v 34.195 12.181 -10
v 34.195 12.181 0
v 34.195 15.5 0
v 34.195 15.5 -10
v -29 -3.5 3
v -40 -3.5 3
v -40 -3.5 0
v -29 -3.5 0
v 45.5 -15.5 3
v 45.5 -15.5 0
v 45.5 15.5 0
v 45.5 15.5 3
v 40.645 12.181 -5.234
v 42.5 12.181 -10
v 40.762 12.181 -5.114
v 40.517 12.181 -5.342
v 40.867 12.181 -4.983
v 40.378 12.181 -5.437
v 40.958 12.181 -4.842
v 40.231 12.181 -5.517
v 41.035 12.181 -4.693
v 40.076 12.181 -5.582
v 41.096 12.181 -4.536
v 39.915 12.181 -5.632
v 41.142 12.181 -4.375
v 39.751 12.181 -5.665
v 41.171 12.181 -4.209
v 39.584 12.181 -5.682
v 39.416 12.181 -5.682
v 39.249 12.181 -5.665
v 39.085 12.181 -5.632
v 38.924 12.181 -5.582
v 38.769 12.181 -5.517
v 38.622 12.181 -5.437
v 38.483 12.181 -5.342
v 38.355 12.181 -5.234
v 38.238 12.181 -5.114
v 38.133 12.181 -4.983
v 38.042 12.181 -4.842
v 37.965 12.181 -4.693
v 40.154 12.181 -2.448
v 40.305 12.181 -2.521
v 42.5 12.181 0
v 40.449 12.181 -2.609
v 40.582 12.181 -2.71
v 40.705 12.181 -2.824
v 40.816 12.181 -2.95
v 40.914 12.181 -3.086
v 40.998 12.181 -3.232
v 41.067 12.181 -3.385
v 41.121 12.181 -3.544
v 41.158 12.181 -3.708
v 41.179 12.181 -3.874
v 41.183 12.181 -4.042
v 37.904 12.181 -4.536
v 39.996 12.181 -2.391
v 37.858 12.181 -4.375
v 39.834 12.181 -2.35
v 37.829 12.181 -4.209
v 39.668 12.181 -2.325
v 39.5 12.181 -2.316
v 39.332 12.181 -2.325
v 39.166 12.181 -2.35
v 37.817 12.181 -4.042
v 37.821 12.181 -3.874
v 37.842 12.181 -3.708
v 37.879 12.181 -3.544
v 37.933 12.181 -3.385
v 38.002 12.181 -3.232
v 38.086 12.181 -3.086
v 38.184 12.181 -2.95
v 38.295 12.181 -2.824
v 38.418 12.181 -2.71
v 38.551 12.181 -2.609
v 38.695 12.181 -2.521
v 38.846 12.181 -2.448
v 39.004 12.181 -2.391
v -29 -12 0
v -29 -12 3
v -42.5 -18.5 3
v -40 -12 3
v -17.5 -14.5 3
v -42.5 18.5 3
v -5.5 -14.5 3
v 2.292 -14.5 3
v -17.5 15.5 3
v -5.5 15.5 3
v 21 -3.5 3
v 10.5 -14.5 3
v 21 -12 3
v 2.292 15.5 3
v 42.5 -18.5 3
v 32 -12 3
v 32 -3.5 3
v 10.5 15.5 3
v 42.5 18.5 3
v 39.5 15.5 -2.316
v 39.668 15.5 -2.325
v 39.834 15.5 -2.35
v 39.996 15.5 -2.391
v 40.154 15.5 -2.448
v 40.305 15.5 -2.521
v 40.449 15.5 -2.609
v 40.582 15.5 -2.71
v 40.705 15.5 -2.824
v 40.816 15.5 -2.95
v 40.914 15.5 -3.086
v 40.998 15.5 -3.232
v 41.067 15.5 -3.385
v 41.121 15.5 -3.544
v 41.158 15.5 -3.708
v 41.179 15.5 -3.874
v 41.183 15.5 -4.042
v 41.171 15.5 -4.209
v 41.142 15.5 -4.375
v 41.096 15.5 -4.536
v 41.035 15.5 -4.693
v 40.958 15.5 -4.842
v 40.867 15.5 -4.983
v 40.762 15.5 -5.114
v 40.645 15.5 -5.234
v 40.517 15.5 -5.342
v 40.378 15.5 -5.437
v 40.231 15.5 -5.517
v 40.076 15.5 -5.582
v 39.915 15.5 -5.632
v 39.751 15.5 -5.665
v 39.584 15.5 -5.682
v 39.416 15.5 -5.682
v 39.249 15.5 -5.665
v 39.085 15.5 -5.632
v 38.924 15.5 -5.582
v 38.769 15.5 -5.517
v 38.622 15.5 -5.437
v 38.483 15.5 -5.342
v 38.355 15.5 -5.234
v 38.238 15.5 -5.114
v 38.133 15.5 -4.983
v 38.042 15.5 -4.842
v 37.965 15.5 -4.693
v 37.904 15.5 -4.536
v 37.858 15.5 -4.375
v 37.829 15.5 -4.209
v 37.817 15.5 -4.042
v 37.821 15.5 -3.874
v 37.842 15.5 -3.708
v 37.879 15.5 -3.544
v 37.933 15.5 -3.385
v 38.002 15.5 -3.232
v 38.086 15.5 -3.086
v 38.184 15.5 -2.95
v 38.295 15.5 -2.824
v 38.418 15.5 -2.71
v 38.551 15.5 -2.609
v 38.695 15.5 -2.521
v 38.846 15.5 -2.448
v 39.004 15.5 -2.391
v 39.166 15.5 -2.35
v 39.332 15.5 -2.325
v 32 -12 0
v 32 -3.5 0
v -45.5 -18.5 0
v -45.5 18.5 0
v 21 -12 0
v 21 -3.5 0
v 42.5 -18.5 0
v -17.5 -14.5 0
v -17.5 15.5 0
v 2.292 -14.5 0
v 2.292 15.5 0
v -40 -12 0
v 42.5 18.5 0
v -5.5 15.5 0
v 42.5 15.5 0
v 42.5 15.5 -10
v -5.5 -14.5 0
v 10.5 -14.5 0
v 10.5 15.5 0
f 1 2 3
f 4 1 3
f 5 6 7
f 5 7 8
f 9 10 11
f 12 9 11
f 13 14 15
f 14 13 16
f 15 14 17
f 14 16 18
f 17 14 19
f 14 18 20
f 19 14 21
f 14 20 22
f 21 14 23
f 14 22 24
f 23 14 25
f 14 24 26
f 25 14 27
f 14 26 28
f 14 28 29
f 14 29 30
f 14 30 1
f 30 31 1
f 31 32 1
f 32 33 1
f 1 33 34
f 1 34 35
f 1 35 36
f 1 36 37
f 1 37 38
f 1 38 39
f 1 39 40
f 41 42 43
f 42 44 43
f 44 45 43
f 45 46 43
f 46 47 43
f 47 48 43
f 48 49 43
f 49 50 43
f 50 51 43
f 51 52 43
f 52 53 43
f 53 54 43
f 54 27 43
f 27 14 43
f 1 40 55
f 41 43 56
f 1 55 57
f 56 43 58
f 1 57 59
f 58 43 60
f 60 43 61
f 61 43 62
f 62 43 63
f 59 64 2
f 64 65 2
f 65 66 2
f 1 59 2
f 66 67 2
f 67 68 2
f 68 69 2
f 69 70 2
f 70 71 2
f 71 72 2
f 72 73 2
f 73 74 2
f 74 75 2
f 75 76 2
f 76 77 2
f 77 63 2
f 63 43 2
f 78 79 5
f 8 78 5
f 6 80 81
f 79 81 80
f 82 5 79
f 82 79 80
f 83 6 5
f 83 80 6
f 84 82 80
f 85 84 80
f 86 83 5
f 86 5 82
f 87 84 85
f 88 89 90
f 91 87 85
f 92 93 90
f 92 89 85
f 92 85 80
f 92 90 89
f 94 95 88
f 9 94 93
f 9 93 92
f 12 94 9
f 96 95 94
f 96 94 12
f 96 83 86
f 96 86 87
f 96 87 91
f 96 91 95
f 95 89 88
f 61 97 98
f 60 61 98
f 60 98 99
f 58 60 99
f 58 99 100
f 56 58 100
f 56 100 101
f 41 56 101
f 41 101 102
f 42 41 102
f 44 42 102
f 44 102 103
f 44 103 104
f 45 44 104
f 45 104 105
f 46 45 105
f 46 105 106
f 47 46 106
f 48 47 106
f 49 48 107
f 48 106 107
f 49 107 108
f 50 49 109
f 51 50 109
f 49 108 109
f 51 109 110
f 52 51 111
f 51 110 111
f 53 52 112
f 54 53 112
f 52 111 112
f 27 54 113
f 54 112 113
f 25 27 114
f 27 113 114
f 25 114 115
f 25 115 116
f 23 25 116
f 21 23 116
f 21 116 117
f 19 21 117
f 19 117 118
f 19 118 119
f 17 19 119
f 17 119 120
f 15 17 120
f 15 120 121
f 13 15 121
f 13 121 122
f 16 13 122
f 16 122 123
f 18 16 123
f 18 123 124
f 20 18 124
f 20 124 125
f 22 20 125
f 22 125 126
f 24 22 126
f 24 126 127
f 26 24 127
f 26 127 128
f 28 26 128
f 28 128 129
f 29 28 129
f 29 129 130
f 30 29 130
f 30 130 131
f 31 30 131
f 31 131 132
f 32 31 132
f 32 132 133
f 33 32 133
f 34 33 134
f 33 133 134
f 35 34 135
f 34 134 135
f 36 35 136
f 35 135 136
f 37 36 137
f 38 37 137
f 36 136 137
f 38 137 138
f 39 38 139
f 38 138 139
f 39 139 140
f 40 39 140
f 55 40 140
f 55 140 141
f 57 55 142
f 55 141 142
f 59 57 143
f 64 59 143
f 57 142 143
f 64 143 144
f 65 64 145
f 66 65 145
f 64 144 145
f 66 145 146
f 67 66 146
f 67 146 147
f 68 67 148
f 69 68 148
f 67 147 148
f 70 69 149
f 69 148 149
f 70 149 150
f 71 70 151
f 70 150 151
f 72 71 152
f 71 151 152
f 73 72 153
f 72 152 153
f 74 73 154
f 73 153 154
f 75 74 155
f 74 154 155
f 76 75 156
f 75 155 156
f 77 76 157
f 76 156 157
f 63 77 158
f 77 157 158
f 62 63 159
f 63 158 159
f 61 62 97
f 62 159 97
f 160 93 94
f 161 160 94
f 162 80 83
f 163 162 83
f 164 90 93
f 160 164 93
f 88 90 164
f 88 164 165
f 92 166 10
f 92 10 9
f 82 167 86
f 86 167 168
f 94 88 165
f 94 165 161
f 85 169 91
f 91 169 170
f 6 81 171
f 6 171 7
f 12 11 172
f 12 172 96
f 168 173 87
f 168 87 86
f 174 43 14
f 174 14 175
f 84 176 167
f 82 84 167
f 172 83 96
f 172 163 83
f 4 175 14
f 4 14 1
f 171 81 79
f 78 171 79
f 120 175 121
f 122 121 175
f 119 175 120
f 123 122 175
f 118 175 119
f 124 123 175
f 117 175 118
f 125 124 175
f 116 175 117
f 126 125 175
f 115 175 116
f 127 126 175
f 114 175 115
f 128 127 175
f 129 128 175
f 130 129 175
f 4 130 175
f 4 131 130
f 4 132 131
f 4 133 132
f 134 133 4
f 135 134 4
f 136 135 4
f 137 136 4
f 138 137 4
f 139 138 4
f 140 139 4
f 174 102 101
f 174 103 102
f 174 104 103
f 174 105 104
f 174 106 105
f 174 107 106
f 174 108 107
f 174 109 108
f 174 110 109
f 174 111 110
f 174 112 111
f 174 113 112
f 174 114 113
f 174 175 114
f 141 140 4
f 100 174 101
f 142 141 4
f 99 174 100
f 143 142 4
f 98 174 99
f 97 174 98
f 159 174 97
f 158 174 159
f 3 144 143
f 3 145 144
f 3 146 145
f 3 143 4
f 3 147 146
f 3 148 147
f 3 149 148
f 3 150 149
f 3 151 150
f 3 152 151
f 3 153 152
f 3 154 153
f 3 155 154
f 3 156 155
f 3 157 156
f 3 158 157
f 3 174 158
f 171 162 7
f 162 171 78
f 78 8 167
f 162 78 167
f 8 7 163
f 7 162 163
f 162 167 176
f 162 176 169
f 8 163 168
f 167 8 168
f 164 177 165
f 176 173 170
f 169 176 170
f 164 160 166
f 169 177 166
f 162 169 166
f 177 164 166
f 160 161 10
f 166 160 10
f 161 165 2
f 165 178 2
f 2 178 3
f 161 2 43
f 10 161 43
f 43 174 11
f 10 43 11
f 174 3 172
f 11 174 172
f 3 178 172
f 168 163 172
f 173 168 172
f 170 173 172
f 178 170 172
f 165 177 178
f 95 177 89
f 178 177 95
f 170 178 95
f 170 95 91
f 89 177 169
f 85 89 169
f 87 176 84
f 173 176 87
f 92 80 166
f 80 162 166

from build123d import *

# Parameters (mm, degrees)
SKETCH_1_W          = 91
SKETCH_1_H          = 37
EXTRUDE_1_DEPTH     = 3
CHAMFER_1_SIZE      = 3
SKETCH_2_W          = 11
SKETCH_2_H          = 8.5
CUT_EXTRUDE_1_DEPTH = 10
SKETCH_3_W          = 12
SKETCH_3_H          = 30
SKETCH_3_W_2        = 8.207535441
CUT_EXTRUDE_2_DEPTH = 10
SKETCH_4_W          = 8.305337468
SKETCH_4_H          = 3.319312894
EXTRUDE_2_DEPTH     = 10
SKETCH_5_R          = 1.683787266
CUT_EXTRUDE_3_DEPTH = 10
CHAMFER_2_SIZE      = 3
CHAMFER_3_SIZE      = 3


with BuildPart() as part:
    # 草图1 → 凸台-拉伸1 (new body)
    with BuildSketch(Plane.XY):
        Rectangle(SKETCH_1_W, SKETCH_1_H)
    extrude(amount=EXTRUDE_1_DEPTH)

    # 倒角1
    chamfer_1_edges = [part.edges().sort_by_distance(p)[0] for p in [
        (-45.5, 0, 3),
    ]]
    chamfer(chamfer_1_edges, length=CHAMFER_1_SIZE - 0.0001)  # a hair under: the kernel refuses the full size

    # 草图2 → 切除-拉伸1 (cut)
    with BuildSketch(Plane.XY.offset(3)):
        with Locations((-34.5, -7.75)):
            Rectangle(SKETCH_2_W, SKETCH_2_H)
        with Locations((26.5, -7.75)):
            Rectangle(SKETCH_2_W, SKETCH_2_H)
    extrude(amount=-CUT_EXTRUDE_1_DEPTH, mode=Mode.SUBTRACT)

    # 草图3 → 切除-拉伸2 (cut)
    with BuildSketch(Plane(origin=(0, 0, 0), x_dir=(-1, 0, 0), z_dir=(0, 0, -1))):
        with Locations((11.5, 0.5)):
            Rectangle(SKETCH_3_W, SKETCH_3_H)
        with Locations((-6.39623228, 0.5)):
            Rectangle(SKETCH_3_W_2, SKETCH_3_H)
    extrude(amount=-CUT_EXTRUDE_2_DEPTH, mode=Mode.SUBTRACT)

    # 草图4 → 凸台-拉伸2 (add)
    with BuildSketch(Plane(origin=(0, 0, 0), x_dir=(-1, 0, 0), z_dir=(0, 0, -1))):
        with Locations((-38.347331266, 13.840343553)):
            Rectangle(SKETCH_4_W, SKETCH_4_H)
    extrude(amount=EXTRUDE_2_DEPTH)

    # 草图5 → 切除-拉伸3 (cut)
    with BuildSketch(Plane(origin=(0, 15.5, 0), x_dir=(1, 0, 0), z_dir=(0, 1, 0))):
        with Locations(Location((39.5, 4, 0), (0, 0, 270))):
            Circle(SKETCH_5_R)
    extrude(amount=-CUT_EXTRUDE_3_DEPTH, mode=Mode.SUBTRACT)

    # 倒角2
    chamfer_2_edges = [part.edges().sort_by_distance(p)[0] for p in [
        (45.5, 18.5, 1.5),
    ]]
    chamfer(chamfer_2_edges, length=CHAMFER_2_SIZE)

    # 倒角3
    chamfer_3_edges = [part.edges().sort_by_distance(p)[0] for p in [
        (45.5, -18.5, 1.5),
    ]]
    chamfer(chamfer_3_edges, length=CHAMFER_3_SIZE)


solid = part.part
